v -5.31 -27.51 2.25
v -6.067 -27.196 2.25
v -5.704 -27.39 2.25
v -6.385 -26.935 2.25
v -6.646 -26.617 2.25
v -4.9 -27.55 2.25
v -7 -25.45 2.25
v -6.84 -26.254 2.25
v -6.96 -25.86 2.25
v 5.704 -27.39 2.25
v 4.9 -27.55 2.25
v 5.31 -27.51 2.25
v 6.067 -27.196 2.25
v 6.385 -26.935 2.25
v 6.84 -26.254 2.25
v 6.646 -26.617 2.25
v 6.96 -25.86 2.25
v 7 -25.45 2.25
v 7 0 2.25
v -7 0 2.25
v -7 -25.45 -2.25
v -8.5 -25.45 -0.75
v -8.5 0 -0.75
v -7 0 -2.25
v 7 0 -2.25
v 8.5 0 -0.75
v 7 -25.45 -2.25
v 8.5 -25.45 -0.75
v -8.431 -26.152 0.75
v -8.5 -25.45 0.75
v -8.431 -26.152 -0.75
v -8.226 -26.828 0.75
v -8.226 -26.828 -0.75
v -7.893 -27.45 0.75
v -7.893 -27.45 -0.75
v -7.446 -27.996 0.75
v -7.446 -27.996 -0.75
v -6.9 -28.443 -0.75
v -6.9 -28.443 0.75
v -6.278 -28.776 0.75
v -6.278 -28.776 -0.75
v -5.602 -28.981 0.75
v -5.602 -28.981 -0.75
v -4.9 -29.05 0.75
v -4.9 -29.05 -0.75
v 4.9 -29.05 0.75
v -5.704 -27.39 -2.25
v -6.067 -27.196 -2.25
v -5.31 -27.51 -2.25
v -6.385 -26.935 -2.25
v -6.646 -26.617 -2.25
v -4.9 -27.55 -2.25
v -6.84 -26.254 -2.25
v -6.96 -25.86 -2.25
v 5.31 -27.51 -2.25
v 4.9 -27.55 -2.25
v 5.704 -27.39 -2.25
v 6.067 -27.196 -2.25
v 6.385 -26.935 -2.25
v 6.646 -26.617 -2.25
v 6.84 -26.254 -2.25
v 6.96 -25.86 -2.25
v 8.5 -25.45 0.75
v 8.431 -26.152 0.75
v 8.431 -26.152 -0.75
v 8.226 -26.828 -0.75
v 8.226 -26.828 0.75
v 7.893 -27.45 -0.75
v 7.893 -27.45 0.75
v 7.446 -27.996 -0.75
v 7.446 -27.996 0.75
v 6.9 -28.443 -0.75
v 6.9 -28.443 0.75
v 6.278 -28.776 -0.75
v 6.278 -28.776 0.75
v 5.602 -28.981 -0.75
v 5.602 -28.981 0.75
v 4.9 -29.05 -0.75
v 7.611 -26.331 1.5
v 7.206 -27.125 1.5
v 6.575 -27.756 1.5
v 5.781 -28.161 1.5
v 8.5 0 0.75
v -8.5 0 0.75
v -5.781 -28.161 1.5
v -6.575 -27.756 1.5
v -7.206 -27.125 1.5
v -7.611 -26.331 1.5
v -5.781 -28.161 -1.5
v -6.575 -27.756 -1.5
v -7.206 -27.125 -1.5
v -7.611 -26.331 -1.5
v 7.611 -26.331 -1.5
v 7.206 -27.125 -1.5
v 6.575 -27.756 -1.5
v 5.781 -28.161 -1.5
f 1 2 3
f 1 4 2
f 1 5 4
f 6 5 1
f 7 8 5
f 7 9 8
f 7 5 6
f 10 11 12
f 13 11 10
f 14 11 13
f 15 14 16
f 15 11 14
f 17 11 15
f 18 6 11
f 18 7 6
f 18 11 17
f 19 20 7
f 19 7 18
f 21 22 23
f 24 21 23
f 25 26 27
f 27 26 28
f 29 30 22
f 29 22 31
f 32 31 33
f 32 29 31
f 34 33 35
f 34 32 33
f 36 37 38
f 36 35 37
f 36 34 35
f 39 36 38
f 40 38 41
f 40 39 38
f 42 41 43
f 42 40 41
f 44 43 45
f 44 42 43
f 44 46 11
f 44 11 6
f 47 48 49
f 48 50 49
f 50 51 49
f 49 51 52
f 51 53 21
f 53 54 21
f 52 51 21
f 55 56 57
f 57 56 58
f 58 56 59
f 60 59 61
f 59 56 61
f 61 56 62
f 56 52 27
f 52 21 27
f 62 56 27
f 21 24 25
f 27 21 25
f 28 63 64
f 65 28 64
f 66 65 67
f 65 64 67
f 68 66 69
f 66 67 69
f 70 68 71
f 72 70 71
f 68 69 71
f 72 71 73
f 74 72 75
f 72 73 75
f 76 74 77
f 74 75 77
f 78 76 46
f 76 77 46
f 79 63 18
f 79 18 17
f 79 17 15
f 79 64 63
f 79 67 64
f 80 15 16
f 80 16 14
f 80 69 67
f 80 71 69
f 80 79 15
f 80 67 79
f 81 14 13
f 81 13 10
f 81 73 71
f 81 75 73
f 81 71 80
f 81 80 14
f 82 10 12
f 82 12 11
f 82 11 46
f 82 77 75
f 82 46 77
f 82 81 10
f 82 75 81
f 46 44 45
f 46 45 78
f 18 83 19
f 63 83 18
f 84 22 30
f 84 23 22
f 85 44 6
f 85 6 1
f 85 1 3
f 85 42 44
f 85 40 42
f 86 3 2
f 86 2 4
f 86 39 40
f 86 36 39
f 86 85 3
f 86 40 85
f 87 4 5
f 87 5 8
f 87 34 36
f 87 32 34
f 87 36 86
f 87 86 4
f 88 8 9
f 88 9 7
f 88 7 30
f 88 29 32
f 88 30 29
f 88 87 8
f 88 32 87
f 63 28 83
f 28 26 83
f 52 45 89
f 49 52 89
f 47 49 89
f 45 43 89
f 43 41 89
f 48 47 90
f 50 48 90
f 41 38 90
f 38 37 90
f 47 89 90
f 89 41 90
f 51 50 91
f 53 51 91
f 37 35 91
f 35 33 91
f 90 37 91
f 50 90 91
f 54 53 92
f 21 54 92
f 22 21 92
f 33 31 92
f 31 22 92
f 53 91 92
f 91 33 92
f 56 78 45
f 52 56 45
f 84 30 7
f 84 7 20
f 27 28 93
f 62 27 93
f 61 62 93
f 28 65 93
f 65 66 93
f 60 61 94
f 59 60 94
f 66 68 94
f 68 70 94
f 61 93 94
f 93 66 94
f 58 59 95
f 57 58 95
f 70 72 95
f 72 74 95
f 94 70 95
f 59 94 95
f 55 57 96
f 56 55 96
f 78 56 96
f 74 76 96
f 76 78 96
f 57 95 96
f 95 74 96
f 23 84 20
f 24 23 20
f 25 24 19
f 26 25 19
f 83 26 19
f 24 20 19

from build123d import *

# Parameters (mm, degrees)
F0_W     = 17
F0_H     = 4.5
F1_DEPTH = 29.05
F2_R     = 3.6
F3_SIZE  = 1.5


with BuildPart() as f1:
    # F0 (on Front) → F1 (new body)
    with BuildSketch(Plane.XZ):
        Rectangle(F0_W, F0_H)
    extrude(amount=F1_DEPTH)

    # F2
    f2_edges = [f1.edges().sort_by_distance(p)[0] for p in [
        (8.5, -29.05, 0),
        (-8.5, -29.05, 0),
    ]]
    fillet(f2_edges, radius=F2_R)

    # F3
    f3_edges = [f1.edges().sort_by_distance(p)[0] for p in [
        (8.5, -12.725, 2.25),
        (8.5, -12.725, -2.25),
        (-8.5, -12.725, 2.25),
        (-8.5, -12.725, -2.25),
        (0, -29.05, 2.25),
        (4.9, -29.05, 0),
        (-4.9, -29.05, 0),
        (0, -29.05, -2.25),
    ]]
    chamfer(f3_edges, length=F3_SIZE)


solid = f1.part
